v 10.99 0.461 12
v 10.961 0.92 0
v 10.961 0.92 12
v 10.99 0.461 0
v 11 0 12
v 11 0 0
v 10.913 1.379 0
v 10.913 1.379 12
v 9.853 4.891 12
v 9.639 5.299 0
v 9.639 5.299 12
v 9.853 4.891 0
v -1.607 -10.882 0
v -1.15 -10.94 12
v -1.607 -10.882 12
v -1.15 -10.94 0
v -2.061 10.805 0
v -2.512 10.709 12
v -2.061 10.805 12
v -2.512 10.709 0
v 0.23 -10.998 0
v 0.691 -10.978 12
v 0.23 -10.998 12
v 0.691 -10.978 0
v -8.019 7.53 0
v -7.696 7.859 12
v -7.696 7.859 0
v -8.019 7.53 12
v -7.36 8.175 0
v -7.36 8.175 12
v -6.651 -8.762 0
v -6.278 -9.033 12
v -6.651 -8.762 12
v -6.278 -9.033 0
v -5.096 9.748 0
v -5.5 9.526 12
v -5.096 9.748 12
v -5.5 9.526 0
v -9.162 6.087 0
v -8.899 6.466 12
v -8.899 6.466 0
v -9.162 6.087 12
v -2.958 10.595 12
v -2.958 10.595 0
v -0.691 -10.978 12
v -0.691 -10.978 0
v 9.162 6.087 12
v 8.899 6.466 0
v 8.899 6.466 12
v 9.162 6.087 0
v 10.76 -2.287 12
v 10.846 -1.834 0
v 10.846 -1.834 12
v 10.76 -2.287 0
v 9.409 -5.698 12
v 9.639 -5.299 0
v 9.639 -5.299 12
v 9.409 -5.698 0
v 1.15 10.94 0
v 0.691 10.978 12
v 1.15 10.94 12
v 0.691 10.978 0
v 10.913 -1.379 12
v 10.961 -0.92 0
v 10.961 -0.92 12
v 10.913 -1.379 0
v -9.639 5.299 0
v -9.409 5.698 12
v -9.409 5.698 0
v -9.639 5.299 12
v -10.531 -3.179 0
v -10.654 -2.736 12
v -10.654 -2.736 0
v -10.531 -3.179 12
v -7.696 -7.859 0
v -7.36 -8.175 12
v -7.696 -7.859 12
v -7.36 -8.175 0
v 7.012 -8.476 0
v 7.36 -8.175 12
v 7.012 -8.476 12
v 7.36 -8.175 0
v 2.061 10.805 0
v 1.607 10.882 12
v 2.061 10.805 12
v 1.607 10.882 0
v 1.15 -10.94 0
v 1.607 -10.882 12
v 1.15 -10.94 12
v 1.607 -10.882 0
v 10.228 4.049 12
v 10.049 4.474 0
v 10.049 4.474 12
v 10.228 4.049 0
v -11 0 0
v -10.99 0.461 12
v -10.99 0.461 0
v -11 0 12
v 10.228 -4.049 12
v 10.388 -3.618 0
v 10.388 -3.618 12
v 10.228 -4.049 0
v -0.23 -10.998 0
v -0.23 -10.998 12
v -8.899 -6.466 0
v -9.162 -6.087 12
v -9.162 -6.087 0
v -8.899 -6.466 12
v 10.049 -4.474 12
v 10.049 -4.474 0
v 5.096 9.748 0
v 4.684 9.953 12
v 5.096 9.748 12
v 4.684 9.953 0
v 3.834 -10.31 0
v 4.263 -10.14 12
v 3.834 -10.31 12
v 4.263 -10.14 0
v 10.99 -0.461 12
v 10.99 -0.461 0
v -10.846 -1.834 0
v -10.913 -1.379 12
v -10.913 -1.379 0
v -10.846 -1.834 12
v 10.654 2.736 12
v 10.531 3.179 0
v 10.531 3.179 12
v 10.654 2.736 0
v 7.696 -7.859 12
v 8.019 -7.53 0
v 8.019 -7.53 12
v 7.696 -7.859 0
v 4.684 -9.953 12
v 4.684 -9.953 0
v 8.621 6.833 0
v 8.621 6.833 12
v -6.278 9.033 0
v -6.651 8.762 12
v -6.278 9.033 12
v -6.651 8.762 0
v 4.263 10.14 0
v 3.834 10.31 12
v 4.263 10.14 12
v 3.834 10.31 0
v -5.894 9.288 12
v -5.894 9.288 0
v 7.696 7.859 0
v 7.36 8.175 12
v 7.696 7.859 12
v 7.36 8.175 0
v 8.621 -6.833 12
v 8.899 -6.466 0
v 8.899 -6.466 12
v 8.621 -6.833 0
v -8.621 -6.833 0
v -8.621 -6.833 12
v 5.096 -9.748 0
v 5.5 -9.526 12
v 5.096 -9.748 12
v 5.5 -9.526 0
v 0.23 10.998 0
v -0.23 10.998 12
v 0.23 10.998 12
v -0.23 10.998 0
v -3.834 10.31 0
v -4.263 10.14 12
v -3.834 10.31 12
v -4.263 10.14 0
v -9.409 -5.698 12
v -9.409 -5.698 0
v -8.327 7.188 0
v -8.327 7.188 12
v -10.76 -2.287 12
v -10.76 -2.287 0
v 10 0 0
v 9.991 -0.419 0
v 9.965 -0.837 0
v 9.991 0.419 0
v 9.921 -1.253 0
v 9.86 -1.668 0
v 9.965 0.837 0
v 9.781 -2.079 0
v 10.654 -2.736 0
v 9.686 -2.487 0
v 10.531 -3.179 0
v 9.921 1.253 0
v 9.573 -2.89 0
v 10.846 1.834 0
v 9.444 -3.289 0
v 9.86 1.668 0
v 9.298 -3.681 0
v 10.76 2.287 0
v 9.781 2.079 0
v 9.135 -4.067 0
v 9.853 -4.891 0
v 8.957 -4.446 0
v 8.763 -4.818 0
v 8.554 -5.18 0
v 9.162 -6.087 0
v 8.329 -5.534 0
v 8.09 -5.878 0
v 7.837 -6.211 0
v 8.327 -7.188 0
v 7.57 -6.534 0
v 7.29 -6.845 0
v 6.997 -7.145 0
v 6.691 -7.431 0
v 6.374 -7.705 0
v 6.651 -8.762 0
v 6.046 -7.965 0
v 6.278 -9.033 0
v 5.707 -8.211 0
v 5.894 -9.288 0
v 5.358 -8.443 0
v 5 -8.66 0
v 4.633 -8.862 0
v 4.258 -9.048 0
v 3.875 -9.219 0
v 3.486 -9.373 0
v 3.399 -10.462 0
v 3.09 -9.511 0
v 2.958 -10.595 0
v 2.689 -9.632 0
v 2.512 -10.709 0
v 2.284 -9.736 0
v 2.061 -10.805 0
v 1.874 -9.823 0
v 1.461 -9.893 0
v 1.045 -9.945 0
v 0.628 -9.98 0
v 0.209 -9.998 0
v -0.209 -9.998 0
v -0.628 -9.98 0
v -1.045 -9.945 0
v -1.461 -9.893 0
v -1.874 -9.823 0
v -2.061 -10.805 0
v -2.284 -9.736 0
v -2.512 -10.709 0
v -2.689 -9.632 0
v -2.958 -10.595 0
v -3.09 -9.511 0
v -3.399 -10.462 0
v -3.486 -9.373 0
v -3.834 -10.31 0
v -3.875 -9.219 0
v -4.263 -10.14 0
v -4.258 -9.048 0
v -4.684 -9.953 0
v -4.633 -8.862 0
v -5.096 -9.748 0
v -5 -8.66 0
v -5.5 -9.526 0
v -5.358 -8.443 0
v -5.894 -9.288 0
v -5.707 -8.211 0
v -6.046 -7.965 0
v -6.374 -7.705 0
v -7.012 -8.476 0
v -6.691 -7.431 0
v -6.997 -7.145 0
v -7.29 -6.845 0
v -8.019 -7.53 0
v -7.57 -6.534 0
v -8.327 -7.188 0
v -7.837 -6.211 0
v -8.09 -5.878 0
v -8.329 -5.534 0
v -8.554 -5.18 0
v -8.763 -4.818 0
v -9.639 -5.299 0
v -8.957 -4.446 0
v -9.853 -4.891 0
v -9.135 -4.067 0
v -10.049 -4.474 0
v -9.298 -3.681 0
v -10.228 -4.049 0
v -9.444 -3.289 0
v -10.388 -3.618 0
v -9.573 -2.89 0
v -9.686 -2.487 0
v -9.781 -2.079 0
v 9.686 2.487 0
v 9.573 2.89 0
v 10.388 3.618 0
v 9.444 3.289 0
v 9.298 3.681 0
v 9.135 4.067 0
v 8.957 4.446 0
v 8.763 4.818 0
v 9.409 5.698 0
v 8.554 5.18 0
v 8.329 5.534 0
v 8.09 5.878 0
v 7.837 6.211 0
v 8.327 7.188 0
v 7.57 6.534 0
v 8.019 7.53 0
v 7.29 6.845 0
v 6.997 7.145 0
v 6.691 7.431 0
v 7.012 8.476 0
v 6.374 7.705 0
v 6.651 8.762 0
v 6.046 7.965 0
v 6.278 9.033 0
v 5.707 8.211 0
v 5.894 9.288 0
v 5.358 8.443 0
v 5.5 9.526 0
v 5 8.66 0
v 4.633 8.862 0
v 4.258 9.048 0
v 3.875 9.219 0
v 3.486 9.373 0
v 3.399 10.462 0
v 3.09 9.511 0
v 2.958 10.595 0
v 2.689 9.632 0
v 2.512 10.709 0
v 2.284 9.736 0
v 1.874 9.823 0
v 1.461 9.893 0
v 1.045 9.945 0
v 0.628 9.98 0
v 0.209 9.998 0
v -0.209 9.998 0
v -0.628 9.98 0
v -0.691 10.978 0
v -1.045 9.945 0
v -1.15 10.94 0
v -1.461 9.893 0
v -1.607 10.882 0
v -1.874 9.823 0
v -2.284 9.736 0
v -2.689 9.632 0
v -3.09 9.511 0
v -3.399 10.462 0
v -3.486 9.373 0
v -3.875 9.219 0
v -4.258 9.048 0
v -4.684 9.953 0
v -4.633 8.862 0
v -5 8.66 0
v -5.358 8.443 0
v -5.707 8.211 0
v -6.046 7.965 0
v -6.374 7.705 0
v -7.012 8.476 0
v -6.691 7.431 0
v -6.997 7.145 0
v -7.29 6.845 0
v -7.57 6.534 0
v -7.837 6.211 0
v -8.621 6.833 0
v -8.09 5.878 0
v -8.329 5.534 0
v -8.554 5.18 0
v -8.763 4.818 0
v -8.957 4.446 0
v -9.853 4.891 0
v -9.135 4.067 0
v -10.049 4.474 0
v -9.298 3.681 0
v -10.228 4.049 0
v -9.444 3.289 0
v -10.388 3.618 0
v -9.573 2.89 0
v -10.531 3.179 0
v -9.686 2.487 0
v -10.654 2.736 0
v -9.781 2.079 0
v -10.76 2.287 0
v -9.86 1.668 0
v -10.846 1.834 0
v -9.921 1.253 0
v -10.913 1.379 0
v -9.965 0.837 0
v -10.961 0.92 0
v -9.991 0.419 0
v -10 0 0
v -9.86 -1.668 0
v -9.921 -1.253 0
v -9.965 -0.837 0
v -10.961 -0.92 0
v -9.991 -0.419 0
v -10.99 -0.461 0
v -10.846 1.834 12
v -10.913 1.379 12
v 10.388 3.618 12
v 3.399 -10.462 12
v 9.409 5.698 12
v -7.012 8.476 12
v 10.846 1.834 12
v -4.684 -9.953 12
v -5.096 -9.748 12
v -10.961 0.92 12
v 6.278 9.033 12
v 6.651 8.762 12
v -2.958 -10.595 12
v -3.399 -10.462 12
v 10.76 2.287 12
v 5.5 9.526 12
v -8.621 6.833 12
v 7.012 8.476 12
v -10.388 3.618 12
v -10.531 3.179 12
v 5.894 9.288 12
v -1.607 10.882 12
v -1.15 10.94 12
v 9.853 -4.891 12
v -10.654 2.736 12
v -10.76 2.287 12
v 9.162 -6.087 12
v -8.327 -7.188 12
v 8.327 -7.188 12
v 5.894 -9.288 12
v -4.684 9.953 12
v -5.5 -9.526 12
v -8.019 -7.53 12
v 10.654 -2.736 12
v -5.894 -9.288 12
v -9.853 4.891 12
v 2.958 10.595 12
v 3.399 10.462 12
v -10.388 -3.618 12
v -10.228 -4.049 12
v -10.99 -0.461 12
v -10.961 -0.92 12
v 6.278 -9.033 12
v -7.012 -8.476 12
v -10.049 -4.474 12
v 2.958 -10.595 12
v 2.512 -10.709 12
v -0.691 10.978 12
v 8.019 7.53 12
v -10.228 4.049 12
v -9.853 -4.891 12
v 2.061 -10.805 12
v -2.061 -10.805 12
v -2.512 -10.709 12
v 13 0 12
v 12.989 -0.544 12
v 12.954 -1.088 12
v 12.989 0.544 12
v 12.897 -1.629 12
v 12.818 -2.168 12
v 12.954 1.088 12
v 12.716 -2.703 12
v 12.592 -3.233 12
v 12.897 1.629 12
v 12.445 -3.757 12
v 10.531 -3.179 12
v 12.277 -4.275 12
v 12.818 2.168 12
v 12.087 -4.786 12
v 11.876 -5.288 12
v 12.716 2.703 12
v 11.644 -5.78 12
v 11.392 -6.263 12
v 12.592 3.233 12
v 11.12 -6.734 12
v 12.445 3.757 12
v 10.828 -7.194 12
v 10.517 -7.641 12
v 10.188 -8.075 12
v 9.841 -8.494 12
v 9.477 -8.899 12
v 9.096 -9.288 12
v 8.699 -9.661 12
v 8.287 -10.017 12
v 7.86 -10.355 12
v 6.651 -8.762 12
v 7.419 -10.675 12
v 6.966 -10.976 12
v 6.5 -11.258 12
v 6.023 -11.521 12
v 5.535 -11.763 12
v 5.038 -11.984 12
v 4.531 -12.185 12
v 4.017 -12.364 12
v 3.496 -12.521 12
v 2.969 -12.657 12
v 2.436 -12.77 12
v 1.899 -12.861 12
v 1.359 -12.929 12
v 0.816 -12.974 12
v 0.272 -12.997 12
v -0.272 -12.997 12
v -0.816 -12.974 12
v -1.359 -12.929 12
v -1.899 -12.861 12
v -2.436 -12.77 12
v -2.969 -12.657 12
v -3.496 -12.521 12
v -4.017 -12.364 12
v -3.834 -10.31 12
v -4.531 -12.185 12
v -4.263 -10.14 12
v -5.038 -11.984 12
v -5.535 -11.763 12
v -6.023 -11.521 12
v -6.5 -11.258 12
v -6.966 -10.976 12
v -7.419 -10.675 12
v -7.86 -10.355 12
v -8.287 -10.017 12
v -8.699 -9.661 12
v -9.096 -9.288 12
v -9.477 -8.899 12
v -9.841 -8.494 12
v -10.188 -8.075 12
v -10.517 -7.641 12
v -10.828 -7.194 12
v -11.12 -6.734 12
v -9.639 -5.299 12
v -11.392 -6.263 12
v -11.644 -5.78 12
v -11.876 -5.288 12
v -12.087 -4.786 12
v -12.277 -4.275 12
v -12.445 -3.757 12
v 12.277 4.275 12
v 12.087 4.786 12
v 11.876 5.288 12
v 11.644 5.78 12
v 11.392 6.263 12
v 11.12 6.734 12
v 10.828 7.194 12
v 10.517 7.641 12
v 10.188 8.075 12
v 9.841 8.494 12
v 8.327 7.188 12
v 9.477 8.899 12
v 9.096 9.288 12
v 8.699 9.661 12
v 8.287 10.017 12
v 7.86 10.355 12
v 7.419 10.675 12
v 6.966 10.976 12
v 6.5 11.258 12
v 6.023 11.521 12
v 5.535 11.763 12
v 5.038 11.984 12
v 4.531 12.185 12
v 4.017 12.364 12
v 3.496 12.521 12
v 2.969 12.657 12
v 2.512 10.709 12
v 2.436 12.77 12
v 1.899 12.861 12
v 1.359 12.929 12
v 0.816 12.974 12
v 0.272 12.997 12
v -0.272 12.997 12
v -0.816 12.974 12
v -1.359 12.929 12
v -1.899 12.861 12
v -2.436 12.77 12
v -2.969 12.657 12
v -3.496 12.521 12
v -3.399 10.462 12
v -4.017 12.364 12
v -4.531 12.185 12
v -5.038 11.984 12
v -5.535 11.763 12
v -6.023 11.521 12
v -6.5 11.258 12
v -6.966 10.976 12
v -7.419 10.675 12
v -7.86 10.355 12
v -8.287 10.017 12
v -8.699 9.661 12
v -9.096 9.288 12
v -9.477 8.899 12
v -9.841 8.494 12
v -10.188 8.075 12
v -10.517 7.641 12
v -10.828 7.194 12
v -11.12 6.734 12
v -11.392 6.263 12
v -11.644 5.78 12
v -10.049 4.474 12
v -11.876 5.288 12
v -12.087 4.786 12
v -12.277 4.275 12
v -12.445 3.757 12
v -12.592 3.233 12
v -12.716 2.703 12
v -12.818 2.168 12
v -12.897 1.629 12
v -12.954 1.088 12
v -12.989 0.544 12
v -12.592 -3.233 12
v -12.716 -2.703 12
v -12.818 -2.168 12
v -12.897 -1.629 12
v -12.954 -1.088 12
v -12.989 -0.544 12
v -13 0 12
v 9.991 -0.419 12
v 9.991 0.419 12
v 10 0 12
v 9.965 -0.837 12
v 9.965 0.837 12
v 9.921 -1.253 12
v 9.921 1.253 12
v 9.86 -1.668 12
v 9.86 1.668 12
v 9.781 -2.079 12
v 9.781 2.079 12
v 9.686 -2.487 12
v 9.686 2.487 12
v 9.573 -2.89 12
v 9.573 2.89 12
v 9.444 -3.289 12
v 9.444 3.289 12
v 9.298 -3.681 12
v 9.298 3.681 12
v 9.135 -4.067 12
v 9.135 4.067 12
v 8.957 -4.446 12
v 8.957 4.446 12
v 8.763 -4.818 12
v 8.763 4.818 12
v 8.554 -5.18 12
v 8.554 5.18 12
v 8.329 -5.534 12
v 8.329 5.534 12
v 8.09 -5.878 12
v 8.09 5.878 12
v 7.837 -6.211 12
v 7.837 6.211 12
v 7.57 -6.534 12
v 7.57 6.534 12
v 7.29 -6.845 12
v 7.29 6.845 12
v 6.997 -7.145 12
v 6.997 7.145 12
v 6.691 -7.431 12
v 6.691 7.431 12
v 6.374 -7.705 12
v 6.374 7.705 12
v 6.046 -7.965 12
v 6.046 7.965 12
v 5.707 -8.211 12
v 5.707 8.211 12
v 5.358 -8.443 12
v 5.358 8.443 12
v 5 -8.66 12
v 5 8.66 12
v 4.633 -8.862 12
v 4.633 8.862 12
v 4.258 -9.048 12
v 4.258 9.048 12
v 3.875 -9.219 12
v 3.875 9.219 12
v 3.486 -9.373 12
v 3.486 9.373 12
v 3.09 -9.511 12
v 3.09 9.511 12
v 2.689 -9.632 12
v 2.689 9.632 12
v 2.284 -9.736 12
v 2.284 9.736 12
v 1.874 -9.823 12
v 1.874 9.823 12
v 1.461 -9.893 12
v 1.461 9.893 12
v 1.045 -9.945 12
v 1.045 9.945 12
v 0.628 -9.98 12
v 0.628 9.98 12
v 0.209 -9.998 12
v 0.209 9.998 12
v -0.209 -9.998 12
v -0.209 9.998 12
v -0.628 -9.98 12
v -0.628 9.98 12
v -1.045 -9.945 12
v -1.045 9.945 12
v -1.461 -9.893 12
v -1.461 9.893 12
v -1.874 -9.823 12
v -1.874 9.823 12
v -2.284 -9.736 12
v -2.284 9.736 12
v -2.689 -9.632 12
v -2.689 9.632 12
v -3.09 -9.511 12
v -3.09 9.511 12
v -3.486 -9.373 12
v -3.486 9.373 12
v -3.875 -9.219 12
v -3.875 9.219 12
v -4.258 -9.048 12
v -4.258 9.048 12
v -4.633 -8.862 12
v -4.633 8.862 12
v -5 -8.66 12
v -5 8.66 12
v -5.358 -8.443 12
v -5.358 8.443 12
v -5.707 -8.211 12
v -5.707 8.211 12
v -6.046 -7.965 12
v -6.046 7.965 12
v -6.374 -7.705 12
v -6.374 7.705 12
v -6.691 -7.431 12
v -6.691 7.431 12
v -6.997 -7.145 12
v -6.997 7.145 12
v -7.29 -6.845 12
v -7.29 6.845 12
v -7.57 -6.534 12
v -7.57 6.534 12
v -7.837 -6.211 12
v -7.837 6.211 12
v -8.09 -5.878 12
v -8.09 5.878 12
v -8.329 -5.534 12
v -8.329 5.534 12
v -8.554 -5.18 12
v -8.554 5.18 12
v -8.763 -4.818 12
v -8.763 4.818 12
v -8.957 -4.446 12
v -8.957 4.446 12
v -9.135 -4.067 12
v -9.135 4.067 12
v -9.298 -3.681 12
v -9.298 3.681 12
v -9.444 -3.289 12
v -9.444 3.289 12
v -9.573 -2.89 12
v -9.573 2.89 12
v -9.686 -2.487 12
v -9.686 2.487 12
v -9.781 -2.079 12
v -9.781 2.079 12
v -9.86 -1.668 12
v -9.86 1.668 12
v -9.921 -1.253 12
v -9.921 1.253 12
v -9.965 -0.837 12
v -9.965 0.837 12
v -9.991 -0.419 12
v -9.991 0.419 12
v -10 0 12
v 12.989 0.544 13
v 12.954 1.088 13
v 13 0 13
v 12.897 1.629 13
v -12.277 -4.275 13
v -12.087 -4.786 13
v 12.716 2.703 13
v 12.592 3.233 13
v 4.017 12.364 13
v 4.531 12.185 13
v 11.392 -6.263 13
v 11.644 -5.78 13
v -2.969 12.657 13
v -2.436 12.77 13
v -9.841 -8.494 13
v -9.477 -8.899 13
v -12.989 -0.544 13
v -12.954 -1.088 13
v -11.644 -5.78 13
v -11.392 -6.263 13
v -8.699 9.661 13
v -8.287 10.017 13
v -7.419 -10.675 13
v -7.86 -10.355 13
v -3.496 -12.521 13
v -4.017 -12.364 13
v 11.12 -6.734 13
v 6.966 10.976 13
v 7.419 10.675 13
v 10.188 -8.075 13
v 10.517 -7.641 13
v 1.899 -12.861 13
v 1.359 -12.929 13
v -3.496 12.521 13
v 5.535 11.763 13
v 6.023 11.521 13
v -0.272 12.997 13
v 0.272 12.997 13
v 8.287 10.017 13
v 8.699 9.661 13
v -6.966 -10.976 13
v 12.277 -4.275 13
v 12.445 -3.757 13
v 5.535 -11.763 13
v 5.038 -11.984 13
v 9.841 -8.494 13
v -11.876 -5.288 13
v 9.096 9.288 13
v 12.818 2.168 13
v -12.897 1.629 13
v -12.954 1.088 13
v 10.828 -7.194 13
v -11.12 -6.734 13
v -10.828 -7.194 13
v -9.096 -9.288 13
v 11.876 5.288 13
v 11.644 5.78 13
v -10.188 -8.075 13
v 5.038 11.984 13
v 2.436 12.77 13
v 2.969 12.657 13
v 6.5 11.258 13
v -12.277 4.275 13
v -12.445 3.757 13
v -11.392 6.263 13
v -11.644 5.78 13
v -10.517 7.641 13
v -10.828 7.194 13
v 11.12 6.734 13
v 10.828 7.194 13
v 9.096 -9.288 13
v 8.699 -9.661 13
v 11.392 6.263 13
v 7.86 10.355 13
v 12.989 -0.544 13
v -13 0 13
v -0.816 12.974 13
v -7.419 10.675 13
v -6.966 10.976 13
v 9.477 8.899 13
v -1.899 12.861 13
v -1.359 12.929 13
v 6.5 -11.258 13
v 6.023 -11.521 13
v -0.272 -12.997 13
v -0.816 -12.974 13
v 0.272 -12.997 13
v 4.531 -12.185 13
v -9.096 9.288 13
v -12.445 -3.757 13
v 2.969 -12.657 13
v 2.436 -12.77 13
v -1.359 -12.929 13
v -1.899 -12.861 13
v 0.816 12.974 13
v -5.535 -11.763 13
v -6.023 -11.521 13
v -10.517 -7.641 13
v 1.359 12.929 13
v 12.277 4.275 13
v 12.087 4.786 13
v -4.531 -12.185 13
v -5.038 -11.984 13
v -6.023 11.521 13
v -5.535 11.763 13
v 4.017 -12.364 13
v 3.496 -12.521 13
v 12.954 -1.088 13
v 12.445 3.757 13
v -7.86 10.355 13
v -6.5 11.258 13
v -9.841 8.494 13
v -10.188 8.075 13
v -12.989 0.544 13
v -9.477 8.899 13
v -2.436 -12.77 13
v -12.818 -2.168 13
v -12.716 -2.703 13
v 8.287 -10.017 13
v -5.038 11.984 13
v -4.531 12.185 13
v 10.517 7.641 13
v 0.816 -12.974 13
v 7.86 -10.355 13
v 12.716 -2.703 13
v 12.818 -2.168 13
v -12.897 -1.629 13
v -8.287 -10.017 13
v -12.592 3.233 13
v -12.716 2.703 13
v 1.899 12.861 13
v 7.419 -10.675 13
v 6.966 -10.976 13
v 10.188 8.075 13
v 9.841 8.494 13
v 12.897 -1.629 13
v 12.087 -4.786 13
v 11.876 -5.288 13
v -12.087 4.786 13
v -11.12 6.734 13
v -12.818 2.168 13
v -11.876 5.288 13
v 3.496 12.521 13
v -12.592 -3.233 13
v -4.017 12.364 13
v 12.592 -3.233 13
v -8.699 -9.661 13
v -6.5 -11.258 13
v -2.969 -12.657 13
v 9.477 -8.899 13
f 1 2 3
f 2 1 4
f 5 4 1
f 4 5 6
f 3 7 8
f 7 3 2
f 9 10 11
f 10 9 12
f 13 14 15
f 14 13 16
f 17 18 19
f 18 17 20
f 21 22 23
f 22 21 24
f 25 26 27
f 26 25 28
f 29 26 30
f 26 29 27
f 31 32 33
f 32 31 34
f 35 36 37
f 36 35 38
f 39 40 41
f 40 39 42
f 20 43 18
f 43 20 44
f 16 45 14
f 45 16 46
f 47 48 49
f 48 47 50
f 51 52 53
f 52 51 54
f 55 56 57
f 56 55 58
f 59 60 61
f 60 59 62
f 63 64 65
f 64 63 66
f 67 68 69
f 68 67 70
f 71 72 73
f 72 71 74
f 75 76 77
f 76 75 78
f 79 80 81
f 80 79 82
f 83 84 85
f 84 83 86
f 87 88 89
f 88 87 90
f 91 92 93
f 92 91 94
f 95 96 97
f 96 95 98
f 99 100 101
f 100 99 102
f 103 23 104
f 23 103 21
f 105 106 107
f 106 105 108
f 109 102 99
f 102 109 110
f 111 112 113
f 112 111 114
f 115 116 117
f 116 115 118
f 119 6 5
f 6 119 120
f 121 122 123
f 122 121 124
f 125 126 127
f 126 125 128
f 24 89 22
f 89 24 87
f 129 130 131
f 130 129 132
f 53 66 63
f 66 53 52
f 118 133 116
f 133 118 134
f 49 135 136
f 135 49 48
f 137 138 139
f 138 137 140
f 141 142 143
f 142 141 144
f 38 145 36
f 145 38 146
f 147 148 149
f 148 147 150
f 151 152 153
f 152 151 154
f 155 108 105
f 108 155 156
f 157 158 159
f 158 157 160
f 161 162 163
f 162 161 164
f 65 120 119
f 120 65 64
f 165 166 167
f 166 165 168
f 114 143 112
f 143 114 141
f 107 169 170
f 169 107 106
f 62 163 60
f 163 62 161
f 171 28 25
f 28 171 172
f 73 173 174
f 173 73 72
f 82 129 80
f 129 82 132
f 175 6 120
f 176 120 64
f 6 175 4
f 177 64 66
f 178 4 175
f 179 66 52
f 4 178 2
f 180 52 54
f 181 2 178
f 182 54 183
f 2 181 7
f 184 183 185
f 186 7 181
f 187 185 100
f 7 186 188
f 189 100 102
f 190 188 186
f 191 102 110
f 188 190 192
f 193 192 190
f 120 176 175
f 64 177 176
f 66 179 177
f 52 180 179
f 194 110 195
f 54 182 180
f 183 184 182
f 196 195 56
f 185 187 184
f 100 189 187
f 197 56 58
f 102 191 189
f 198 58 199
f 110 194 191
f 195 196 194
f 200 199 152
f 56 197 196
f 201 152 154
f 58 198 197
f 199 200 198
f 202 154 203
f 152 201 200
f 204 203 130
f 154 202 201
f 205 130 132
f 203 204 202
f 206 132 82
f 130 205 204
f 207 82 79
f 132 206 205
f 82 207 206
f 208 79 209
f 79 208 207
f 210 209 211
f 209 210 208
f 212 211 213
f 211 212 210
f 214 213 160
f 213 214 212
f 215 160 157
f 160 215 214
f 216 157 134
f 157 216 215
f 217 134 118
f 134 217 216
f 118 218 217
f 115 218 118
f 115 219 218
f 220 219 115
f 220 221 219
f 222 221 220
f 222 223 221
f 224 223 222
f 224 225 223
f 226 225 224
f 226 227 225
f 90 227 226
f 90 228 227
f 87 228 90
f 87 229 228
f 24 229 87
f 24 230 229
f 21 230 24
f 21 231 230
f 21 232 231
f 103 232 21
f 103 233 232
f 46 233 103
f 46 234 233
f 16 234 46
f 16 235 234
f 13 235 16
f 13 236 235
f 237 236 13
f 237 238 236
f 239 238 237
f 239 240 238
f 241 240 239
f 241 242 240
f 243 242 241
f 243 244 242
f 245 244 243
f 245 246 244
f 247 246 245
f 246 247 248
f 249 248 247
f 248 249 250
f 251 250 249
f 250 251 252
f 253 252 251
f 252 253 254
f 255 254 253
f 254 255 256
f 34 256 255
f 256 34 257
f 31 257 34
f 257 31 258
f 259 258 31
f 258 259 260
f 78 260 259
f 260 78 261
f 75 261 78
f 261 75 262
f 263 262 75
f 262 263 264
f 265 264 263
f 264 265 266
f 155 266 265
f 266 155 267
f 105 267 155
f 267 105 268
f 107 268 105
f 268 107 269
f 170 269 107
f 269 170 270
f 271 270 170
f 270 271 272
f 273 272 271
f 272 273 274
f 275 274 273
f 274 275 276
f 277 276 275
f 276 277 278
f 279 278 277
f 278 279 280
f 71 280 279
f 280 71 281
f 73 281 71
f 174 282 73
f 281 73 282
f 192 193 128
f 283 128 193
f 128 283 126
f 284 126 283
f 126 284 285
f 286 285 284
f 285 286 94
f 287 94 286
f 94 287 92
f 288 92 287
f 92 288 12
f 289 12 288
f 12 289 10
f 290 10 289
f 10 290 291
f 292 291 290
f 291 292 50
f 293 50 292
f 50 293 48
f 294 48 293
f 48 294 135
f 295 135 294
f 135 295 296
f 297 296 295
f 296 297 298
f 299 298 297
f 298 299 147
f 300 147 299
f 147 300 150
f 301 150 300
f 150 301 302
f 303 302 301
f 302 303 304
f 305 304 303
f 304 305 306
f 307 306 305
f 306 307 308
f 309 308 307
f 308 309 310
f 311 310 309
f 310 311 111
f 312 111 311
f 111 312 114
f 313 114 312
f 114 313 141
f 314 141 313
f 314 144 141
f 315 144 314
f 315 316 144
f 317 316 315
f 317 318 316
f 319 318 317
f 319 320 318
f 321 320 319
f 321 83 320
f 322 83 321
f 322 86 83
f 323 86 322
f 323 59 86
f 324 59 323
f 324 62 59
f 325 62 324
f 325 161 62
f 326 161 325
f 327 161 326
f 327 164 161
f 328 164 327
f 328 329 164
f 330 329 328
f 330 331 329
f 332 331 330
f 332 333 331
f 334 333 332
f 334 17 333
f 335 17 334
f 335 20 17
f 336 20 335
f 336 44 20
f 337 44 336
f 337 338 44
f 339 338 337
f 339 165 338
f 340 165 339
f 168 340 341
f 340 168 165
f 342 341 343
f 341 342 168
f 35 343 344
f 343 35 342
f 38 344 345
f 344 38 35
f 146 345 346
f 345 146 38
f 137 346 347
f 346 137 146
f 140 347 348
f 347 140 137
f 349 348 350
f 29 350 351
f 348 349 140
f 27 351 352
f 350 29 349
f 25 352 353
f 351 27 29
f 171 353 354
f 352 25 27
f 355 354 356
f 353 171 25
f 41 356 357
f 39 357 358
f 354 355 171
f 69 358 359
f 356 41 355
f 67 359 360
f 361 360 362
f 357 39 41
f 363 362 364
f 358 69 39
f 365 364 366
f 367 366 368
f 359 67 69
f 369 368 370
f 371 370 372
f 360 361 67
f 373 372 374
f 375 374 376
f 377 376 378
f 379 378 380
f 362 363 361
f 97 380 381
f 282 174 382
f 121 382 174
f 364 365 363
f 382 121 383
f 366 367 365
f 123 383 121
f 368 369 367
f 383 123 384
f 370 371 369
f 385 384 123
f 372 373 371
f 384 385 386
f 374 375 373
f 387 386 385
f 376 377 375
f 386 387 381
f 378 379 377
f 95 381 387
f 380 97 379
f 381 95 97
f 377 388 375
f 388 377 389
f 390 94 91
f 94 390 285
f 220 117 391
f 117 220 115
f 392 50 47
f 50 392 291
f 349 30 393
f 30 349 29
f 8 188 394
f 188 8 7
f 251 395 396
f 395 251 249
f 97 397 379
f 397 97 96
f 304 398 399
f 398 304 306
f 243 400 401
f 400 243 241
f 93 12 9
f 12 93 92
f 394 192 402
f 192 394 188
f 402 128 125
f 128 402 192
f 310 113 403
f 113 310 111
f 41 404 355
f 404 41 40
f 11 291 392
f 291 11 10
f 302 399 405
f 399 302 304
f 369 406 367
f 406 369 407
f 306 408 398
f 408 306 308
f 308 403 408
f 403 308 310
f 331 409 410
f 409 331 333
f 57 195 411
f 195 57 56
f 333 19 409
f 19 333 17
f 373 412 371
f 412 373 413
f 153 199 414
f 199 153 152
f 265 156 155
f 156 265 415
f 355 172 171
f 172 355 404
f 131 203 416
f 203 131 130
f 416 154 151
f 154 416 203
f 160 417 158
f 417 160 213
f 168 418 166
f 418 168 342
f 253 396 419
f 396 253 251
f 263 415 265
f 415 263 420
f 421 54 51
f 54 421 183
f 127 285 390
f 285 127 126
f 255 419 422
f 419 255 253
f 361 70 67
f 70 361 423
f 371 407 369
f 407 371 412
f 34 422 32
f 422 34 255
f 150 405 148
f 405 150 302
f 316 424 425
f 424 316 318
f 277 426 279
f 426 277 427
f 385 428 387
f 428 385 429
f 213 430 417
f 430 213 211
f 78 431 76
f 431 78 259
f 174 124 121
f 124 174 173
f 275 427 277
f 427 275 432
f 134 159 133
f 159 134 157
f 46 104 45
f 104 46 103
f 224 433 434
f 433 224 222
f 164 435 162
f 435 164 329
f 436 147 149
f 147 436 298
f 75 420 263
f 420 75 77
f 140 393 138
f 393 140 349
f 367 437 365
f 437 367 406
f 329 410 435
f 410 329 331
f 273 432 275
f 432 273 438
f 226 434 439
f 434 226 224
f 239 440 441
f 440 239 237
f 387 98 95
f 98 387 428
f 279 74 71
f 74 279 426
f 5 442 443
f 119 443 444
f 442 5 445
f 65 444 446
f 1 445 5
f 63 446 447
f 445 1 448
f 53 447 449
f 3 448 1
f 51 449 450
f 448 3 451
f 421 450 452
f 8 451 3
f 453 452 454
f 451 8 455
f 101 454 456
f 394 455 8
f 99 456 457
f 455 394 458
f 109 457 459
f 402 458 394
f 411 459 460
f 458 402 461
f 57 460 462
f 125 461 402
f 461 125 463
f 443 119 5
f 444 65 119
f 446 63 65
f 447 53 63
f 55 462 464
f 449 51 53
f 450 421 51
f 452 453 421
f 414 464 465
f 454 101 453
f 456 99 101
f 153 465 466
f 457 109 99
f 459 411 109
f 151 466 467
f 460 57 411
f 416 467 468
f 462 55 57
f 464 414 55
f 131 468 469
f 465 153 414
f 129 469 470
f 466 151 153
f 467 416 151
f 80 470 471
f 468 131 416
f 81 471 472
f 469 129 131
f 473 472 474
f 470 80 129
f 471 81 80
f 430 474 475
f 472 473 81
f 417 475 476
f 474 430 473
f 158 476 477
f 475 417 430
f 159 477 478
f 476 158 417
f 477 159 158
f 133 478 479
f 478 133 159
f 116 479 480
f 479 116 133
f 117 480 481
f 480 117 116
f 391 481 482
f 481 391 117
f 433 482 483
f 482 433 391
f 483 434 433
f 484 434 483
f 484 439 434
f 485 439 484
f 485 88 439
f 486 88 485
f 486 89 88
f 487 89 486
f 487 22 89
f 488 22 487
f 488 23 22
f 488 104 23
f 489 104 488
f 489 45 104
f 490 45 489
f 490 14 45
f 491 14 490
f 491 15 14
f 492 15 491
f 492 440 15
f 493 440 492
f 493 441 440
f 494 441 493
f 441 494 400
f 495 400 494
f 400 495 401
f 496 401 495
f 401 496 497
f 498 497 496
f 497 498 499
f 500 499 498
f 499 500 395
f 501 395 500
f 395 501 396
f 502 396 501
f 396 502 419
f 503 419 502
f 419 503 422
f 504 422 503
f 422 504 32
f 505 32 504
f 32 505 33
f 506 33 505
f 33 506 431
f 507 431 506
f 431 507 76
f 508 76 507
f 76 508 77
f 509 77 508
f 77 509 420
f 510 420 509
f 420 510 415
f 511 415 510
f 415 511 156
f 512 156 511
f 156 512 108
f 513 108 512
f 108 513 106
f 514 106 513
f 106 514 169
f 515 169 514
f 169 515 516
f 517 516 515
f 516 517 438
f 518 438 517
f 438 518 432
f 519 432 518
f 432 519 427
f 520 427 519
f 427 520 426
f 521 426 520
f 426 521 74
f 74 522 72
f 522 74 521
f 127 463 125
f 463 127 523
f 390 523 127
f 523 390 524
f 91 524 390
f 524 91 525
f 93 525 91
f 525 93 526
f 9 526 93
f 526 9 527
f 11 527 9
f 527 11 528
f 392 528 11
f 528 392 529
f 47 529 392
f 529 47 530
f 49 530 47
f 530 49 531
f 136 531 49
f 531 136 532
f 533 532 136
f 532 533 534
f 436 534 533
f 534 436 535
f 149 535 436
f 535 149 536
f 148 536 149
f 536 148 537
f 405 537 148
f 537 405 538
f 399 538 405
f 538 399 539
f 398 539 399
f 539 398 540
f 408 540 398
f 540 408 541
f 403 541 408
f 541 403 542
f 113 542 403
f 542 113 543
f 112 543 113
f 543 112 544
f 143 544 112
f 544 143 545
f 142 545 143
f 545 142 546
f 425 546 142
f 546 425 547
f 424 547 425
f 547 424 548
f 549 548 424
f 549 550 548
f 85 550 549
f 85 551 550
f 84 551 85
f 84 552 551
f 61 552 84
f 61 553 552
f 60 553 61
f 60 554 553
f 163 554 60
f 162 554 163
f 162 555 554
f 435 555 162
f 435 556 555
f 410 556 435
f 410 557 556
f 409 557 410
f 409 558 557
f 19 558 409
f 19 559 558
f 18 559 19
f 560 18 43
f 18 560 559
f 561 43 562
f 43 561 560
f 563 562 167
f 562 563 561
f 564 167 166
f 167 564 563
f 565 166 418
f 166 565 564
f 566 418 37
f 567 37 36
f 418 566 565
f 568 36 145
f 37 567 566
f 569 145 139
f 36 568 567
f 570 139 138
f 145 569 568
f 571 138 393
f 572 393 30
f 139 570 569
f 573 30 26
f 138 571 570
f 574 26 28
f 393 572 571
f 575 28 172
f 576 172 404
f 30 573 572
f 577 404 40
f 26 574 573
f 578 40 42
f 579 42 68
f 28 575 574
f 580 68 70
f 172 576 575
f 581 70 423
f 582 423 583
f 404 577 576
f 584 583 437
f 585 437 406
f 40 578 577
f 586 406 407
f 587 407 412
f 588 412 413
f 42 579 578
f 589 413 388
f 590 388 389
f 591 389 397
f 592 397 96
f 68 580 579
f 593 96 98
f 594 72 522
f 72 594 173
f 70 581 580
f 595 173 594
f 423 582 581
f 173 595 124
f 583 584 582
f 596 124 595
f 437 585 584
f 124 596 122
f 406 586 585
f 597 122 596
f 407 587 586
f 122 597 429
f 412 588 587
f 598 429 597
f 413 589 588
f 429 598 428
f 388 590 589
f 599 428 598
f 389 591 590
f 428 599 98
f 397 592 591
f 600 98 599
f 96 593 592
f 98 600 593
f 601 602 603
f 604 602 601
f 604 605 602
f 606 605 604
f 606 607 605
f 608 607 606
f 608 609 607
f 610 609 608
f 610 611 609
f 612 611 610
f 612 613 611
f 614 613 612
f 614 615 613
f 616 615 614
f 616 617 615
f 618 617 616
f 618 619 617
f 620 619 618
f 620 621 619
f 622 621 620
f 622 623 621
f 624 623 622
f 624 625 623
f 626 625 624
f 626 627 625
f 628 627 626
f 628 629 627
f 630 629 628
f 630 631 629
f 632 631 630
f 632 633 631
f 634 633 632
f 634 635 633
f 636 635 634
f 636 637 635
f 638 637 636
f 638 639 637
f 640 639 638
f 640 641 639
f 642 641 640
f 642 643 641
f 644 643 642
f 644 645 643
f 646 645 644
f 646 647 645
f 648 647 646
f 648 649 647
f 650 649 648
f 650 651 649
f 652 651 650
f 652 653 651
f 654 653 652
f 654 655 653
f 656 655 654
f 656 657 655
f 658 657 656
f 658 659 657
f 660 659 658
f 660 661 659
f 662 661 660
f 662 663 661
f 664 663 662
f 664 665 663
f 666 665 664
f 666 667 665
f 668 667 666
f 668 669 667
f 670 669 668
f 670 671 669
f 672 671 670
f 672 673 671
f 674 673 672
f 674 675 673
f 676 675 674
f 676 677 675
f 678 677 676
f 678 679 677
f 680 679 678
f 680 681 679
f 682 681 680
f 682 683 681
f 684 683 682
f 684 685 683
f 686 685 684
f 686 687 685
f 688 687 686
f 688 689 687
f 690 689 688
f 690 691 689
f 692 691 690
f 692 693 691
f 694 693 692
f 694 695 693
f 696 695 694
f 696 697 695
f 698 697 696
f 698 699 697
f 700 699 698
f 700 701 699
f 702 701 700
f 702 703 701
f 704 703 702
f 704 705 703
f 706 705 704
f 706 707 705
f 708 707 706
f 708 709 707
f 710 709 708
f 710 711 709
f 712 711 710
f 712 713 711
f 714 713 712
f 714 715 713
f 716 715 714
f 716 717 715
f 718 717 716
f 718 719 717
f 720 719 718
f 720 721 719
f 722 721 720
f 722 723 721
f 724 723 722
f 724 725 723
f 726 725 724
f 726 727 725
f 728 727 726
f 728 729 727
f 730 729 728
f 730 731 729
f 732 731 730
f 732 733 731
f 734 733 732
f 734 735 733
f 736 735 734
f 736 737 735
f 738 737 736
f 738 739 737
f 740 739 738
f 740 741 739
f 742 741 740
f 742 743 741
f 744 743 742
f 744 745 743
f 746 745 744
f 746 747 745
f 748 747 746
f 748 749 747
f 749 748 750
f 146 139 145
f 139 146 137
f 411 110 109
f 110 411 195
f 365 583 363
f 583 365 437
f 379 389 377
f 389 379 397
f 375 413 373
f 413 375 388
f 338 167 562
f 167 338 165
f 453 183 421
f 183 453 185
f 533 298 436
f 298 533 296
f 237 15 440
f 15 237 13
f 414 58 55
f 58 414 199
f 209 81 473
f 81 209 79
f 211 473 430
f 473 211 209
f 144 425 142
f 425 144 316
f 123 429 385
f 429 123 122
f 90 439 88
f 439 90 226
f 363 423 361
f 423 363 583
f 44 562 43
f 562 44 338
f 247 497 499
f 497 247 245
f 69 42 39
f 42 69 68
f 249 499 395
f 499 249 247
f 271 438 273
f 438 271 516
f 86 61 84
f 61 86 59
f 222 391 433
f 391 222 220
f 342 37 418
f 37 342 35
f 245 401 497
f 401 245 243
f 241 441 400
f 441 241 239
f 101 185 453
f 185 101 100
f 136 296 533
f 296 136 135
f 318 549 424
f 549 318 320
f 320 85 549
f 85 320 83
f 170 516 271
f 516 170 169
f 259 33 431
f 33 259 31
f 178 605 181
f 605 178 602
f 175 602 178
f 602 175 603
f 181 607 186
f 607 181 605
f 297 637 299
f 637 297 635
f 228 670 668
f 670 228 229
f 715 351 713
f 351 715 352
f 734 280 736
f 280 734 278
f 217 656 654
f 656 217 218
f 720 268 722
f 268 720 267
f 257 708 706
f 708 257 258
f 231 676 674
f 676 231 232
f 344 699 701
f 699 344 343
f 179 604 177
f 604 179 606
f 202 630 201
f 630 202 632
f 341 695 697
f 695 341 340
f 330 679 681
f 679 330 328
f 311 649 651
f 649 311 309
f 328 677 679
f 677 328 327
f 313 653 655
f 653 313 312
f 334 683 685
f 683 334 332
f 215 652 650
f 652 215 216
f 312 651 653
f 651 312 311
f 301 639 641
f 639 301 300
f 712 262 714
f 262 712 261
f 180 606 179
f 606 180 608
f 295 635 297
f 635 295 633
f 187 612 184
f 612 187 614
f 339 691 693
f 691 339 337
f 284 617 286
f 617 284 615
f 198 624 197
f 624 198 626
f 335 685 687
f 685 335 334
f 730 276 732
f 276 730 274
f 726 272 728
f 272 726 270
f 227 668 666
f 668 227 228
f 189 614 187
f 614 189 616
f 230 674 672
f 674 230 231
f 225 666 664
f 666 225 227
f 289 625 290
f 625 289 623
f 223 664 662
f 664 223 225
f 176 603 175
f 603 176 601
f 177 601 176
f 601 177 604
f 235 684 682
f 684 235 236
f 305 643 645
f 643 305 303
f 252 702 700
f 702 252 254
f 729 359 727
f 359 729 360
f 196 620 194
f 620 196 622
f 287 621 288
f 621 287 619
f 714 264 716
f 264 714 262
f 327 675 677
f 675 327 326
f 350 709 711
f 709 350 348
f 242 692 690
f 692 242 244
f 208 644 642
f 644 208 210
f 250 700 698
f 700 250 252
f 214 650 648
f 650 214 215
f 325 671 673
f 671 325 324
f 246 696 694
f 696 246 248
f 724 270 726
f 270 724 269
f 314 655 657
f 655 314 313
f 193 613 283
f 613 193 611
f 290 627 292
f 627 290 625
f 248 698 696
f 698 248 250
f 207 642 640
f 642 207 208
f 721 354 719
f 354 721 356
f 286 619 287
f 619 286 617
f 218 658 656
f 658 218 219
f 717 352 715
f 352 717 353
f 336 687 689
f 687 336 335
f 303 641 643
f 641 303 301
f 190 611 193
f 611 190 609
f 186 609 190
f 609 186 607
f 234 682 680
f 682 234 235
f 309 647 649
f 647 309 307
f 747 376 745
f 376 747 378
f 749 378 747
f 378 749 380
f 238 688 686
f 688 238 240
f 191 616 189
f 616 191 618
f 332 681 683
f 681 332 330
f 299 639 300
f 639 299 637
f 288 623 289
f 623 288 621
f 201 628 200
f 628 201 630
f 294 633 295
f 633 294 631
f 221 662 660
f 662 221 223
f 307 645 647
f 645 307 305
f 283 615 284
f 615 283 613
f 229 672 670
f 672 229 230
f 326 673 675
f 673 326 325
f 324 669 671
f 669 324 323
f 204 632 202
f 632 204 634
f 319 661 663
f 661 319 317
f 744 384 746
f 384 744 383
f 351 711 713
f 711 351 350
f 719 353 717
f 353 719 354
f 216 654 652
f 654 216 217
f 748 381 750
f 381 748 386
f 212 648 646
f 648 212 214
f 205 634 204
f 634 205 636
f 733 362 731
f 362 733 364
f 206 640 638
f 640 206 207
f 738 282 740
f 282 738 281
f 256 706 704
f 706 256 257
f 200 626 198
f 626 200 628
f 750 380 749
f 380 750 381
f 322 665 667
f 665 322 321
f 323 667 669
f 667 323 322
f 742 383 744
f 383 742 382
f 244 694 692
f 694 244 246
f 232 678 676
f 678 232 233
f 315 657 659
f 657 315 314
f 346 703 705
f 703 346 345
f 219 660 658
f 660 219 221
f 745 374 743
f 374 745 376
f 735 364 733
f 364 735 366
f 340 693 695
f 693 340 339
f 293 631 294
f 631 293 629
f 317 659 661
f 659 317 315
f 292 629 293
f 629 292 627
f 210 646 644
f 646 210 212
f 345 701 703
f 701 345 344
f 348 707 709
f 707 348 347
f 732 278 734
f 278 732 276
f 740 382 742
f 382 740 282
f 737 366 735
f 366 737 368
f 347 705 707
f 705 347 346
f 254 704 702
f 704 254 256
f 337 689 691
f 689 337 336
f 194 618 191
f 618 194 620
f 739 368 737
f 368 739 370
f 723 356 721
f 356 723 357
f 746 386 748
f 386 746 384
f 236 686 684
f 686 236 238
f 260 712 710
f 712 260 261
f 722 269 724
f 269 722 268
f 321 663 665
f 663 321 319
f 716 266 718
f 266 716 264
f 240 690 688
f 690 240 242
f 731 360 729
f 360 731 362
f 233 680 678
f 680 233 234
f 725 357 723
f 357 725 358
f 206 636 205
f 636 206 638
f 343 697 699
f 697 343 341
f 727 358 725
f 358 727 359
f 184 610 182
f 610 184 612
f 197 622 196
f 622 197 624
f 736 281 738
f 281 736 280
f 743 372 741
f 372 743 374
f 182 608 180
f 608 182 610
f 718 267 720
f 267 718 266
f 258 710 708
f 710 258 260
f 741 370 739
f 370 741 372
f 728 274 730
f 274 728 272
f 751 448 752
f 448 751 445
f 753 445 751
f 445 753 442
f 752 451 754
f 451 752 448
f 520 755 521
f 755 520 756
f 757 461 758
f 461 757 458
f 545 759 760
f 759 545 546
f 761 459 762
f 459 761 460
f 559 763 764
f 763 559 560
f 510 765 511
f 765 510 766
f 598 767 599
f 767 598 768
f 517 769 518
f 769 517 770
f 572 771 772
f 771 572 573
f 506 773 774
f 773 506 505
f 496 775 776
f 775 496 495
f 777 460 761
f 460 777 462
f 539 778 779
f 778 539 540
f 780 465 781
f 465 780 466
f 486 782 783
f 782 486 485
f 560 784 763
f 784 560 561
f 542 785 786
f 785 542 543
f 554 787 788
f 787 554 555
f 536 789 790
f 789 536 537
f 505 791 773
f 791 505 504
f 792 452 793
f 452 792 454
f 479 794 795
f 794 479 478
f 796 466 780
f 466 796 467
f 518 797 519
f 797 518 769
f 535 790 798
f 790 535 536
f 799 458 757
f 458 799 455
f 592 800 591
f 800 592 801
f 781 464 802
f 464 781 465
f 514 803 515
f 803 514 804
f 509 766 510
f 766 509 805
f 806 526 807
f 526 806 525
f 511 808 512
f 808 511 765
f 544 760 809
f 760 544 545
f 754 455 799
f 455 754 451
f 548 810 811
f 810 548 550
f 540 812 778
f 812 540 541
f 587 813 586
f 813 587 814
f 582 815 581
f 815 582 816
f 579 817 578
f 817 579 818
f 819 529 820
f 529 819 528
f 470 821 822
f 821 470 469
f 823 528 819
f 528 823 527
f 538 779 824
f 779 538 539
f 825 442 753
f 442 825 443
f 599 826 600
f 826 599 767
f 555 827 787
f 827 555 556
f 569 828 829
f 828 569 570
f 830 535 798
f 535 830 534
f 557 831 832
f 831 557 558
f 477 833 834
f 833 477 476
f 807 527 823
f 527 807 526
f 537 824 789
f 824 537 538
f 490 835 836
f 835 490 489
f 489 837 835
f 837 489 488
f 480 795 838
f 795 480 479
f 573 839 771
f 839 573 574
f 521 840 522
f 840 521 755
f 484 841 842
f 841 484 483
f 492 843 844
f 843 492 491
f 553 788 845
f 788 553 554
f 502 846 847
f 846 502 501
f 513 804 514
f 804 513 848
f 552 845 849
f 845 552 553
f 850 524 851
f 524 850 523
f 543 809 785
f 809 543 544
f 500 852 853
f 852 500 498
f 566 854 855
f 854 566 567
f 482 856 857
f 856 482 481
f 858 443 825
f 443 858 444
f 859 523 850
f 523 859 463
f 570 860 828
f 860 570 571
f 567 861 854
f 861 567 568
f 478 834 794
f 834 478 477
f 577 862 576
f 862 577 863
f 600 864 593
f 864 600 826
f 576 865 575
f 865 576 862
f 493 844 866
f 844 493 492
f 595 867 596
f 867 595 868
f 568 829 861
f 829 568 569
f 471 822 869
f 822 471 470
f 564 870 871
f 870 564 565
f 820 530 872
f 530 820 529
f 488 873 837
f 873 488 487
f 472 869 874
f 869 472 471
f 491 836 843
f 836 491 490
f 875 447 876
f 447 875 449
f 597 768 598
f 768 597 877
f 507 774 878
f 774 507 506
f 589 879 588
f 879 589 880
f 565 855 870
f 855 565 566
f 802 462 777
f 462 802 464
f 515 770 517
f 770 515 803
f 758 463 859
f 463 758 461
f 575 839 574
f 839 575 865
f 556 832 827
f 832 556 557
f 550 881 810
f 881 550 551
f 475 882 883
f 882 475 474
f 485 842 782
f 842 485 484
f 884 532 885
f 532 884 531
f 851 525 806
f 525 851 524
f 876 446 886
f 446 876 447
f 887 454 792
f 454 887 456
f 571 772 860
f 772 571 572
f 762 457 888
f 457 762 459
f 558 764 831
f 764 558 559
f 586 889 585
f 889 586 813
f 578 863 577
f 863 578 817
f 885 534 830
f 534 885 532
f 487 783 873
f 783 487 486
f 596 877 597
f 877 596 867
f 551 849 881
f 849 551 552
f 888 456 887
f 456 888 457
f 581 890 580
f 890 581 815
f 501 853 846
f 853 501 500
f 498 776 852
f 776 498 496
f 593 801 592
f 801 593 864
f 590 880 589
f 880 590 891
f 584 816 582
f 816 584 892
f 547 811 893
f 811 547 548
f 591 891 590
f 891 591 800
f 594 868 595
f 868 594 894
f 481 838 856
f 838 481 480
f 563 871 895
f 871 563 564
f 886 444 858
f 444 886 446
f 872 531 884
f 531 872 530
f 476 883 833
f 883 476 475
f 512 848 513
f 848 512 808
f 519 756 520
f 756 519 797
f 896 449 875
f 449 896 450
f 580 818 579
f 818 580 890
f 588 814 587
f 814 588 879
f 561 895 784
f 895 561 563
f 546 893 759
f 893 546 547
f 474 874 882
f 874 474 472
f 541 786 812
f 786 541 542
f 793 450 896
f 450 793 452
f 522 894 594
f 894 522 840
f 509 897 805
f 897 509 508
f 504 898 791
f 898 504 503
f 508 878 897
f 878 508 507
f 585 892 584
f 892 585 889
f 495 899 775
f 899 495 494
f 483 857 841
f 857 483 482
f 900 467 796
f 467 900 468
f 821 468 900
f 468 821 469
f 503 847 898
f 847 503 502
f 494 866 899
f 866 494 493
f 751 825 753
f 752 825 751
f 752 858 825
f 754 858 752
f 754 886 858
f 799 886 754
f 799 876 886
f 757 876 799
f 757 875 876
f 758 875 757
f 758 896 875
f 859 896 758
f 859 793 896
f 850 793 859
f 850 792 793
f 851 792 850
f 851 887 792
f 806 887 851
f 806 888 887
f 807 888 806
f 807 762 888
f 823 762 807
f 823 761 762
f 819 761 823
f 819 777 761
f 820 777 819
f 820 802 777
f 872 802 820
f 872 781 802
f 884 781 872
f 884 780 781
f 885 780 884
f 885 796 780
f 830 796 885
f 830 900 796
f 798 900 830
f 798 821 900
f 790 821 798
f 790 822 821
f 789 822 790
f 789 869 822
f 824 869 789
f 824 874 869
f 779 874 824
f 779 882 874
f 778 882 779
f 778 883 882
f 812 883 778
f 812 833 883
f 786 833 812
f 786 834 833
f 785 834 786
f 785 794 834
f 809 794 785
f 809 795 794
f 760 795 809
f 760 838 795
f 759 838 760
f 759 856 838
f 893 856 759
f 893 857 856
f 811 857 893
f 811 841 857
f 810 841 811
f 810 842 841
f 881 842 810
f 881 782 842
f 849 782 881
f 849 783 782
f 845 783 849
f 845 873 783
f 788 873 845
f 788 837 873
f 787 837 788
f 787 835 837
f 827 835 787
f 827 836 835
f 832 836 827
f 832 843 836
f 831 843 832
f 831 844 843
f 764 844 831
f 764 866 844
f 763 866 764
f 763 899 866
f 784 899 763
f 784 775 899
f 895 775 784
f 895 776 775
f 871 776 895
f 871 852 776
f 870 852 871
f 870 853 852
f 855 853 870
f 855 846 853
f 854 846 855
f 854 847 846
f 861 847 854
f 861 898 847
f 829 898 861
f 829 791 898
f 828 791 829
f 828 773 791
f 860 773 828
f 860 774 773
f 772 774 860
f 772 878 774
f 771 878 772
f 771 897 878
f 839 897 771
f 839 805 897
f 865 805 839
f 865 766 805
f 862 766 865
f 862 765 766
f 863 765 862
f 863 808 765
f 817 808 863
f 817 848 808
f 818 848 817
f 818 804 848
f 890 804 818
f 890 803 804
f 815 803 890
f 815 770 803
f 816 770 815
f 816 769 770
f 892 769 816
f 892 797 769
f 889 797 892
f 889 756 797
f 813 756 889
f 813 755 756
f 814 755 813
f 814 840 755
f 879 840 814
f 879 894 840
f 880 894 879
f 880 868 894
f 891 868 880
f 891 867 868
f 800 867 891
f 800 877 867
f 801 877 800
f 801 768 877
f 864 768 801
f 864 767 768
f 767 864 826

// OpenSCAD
/** [Pegboard top Info] **/
bar_diam = 20;
wall_width = 1;
height = 12;

/** [Other] **/
fn=150;

tolerance = 0.4;

// Small cuantity to ensure cutting though
epsilon = 0.1;

module pegboard_top() {
    translate([0, 0, height])
    cylinder(d=bar_diam+wall_width*6, h=wall_width, $fn=fn);
    difference()
    {
        cylinder(d=bar_diam+wall_width*2, h=height, $fn=fn);
        translate([0, 0, -epsilon])
        cylinder(d=bar_diam, h=height+epsilon*2, $fn=fn);
    }
}

pegboard_top();
